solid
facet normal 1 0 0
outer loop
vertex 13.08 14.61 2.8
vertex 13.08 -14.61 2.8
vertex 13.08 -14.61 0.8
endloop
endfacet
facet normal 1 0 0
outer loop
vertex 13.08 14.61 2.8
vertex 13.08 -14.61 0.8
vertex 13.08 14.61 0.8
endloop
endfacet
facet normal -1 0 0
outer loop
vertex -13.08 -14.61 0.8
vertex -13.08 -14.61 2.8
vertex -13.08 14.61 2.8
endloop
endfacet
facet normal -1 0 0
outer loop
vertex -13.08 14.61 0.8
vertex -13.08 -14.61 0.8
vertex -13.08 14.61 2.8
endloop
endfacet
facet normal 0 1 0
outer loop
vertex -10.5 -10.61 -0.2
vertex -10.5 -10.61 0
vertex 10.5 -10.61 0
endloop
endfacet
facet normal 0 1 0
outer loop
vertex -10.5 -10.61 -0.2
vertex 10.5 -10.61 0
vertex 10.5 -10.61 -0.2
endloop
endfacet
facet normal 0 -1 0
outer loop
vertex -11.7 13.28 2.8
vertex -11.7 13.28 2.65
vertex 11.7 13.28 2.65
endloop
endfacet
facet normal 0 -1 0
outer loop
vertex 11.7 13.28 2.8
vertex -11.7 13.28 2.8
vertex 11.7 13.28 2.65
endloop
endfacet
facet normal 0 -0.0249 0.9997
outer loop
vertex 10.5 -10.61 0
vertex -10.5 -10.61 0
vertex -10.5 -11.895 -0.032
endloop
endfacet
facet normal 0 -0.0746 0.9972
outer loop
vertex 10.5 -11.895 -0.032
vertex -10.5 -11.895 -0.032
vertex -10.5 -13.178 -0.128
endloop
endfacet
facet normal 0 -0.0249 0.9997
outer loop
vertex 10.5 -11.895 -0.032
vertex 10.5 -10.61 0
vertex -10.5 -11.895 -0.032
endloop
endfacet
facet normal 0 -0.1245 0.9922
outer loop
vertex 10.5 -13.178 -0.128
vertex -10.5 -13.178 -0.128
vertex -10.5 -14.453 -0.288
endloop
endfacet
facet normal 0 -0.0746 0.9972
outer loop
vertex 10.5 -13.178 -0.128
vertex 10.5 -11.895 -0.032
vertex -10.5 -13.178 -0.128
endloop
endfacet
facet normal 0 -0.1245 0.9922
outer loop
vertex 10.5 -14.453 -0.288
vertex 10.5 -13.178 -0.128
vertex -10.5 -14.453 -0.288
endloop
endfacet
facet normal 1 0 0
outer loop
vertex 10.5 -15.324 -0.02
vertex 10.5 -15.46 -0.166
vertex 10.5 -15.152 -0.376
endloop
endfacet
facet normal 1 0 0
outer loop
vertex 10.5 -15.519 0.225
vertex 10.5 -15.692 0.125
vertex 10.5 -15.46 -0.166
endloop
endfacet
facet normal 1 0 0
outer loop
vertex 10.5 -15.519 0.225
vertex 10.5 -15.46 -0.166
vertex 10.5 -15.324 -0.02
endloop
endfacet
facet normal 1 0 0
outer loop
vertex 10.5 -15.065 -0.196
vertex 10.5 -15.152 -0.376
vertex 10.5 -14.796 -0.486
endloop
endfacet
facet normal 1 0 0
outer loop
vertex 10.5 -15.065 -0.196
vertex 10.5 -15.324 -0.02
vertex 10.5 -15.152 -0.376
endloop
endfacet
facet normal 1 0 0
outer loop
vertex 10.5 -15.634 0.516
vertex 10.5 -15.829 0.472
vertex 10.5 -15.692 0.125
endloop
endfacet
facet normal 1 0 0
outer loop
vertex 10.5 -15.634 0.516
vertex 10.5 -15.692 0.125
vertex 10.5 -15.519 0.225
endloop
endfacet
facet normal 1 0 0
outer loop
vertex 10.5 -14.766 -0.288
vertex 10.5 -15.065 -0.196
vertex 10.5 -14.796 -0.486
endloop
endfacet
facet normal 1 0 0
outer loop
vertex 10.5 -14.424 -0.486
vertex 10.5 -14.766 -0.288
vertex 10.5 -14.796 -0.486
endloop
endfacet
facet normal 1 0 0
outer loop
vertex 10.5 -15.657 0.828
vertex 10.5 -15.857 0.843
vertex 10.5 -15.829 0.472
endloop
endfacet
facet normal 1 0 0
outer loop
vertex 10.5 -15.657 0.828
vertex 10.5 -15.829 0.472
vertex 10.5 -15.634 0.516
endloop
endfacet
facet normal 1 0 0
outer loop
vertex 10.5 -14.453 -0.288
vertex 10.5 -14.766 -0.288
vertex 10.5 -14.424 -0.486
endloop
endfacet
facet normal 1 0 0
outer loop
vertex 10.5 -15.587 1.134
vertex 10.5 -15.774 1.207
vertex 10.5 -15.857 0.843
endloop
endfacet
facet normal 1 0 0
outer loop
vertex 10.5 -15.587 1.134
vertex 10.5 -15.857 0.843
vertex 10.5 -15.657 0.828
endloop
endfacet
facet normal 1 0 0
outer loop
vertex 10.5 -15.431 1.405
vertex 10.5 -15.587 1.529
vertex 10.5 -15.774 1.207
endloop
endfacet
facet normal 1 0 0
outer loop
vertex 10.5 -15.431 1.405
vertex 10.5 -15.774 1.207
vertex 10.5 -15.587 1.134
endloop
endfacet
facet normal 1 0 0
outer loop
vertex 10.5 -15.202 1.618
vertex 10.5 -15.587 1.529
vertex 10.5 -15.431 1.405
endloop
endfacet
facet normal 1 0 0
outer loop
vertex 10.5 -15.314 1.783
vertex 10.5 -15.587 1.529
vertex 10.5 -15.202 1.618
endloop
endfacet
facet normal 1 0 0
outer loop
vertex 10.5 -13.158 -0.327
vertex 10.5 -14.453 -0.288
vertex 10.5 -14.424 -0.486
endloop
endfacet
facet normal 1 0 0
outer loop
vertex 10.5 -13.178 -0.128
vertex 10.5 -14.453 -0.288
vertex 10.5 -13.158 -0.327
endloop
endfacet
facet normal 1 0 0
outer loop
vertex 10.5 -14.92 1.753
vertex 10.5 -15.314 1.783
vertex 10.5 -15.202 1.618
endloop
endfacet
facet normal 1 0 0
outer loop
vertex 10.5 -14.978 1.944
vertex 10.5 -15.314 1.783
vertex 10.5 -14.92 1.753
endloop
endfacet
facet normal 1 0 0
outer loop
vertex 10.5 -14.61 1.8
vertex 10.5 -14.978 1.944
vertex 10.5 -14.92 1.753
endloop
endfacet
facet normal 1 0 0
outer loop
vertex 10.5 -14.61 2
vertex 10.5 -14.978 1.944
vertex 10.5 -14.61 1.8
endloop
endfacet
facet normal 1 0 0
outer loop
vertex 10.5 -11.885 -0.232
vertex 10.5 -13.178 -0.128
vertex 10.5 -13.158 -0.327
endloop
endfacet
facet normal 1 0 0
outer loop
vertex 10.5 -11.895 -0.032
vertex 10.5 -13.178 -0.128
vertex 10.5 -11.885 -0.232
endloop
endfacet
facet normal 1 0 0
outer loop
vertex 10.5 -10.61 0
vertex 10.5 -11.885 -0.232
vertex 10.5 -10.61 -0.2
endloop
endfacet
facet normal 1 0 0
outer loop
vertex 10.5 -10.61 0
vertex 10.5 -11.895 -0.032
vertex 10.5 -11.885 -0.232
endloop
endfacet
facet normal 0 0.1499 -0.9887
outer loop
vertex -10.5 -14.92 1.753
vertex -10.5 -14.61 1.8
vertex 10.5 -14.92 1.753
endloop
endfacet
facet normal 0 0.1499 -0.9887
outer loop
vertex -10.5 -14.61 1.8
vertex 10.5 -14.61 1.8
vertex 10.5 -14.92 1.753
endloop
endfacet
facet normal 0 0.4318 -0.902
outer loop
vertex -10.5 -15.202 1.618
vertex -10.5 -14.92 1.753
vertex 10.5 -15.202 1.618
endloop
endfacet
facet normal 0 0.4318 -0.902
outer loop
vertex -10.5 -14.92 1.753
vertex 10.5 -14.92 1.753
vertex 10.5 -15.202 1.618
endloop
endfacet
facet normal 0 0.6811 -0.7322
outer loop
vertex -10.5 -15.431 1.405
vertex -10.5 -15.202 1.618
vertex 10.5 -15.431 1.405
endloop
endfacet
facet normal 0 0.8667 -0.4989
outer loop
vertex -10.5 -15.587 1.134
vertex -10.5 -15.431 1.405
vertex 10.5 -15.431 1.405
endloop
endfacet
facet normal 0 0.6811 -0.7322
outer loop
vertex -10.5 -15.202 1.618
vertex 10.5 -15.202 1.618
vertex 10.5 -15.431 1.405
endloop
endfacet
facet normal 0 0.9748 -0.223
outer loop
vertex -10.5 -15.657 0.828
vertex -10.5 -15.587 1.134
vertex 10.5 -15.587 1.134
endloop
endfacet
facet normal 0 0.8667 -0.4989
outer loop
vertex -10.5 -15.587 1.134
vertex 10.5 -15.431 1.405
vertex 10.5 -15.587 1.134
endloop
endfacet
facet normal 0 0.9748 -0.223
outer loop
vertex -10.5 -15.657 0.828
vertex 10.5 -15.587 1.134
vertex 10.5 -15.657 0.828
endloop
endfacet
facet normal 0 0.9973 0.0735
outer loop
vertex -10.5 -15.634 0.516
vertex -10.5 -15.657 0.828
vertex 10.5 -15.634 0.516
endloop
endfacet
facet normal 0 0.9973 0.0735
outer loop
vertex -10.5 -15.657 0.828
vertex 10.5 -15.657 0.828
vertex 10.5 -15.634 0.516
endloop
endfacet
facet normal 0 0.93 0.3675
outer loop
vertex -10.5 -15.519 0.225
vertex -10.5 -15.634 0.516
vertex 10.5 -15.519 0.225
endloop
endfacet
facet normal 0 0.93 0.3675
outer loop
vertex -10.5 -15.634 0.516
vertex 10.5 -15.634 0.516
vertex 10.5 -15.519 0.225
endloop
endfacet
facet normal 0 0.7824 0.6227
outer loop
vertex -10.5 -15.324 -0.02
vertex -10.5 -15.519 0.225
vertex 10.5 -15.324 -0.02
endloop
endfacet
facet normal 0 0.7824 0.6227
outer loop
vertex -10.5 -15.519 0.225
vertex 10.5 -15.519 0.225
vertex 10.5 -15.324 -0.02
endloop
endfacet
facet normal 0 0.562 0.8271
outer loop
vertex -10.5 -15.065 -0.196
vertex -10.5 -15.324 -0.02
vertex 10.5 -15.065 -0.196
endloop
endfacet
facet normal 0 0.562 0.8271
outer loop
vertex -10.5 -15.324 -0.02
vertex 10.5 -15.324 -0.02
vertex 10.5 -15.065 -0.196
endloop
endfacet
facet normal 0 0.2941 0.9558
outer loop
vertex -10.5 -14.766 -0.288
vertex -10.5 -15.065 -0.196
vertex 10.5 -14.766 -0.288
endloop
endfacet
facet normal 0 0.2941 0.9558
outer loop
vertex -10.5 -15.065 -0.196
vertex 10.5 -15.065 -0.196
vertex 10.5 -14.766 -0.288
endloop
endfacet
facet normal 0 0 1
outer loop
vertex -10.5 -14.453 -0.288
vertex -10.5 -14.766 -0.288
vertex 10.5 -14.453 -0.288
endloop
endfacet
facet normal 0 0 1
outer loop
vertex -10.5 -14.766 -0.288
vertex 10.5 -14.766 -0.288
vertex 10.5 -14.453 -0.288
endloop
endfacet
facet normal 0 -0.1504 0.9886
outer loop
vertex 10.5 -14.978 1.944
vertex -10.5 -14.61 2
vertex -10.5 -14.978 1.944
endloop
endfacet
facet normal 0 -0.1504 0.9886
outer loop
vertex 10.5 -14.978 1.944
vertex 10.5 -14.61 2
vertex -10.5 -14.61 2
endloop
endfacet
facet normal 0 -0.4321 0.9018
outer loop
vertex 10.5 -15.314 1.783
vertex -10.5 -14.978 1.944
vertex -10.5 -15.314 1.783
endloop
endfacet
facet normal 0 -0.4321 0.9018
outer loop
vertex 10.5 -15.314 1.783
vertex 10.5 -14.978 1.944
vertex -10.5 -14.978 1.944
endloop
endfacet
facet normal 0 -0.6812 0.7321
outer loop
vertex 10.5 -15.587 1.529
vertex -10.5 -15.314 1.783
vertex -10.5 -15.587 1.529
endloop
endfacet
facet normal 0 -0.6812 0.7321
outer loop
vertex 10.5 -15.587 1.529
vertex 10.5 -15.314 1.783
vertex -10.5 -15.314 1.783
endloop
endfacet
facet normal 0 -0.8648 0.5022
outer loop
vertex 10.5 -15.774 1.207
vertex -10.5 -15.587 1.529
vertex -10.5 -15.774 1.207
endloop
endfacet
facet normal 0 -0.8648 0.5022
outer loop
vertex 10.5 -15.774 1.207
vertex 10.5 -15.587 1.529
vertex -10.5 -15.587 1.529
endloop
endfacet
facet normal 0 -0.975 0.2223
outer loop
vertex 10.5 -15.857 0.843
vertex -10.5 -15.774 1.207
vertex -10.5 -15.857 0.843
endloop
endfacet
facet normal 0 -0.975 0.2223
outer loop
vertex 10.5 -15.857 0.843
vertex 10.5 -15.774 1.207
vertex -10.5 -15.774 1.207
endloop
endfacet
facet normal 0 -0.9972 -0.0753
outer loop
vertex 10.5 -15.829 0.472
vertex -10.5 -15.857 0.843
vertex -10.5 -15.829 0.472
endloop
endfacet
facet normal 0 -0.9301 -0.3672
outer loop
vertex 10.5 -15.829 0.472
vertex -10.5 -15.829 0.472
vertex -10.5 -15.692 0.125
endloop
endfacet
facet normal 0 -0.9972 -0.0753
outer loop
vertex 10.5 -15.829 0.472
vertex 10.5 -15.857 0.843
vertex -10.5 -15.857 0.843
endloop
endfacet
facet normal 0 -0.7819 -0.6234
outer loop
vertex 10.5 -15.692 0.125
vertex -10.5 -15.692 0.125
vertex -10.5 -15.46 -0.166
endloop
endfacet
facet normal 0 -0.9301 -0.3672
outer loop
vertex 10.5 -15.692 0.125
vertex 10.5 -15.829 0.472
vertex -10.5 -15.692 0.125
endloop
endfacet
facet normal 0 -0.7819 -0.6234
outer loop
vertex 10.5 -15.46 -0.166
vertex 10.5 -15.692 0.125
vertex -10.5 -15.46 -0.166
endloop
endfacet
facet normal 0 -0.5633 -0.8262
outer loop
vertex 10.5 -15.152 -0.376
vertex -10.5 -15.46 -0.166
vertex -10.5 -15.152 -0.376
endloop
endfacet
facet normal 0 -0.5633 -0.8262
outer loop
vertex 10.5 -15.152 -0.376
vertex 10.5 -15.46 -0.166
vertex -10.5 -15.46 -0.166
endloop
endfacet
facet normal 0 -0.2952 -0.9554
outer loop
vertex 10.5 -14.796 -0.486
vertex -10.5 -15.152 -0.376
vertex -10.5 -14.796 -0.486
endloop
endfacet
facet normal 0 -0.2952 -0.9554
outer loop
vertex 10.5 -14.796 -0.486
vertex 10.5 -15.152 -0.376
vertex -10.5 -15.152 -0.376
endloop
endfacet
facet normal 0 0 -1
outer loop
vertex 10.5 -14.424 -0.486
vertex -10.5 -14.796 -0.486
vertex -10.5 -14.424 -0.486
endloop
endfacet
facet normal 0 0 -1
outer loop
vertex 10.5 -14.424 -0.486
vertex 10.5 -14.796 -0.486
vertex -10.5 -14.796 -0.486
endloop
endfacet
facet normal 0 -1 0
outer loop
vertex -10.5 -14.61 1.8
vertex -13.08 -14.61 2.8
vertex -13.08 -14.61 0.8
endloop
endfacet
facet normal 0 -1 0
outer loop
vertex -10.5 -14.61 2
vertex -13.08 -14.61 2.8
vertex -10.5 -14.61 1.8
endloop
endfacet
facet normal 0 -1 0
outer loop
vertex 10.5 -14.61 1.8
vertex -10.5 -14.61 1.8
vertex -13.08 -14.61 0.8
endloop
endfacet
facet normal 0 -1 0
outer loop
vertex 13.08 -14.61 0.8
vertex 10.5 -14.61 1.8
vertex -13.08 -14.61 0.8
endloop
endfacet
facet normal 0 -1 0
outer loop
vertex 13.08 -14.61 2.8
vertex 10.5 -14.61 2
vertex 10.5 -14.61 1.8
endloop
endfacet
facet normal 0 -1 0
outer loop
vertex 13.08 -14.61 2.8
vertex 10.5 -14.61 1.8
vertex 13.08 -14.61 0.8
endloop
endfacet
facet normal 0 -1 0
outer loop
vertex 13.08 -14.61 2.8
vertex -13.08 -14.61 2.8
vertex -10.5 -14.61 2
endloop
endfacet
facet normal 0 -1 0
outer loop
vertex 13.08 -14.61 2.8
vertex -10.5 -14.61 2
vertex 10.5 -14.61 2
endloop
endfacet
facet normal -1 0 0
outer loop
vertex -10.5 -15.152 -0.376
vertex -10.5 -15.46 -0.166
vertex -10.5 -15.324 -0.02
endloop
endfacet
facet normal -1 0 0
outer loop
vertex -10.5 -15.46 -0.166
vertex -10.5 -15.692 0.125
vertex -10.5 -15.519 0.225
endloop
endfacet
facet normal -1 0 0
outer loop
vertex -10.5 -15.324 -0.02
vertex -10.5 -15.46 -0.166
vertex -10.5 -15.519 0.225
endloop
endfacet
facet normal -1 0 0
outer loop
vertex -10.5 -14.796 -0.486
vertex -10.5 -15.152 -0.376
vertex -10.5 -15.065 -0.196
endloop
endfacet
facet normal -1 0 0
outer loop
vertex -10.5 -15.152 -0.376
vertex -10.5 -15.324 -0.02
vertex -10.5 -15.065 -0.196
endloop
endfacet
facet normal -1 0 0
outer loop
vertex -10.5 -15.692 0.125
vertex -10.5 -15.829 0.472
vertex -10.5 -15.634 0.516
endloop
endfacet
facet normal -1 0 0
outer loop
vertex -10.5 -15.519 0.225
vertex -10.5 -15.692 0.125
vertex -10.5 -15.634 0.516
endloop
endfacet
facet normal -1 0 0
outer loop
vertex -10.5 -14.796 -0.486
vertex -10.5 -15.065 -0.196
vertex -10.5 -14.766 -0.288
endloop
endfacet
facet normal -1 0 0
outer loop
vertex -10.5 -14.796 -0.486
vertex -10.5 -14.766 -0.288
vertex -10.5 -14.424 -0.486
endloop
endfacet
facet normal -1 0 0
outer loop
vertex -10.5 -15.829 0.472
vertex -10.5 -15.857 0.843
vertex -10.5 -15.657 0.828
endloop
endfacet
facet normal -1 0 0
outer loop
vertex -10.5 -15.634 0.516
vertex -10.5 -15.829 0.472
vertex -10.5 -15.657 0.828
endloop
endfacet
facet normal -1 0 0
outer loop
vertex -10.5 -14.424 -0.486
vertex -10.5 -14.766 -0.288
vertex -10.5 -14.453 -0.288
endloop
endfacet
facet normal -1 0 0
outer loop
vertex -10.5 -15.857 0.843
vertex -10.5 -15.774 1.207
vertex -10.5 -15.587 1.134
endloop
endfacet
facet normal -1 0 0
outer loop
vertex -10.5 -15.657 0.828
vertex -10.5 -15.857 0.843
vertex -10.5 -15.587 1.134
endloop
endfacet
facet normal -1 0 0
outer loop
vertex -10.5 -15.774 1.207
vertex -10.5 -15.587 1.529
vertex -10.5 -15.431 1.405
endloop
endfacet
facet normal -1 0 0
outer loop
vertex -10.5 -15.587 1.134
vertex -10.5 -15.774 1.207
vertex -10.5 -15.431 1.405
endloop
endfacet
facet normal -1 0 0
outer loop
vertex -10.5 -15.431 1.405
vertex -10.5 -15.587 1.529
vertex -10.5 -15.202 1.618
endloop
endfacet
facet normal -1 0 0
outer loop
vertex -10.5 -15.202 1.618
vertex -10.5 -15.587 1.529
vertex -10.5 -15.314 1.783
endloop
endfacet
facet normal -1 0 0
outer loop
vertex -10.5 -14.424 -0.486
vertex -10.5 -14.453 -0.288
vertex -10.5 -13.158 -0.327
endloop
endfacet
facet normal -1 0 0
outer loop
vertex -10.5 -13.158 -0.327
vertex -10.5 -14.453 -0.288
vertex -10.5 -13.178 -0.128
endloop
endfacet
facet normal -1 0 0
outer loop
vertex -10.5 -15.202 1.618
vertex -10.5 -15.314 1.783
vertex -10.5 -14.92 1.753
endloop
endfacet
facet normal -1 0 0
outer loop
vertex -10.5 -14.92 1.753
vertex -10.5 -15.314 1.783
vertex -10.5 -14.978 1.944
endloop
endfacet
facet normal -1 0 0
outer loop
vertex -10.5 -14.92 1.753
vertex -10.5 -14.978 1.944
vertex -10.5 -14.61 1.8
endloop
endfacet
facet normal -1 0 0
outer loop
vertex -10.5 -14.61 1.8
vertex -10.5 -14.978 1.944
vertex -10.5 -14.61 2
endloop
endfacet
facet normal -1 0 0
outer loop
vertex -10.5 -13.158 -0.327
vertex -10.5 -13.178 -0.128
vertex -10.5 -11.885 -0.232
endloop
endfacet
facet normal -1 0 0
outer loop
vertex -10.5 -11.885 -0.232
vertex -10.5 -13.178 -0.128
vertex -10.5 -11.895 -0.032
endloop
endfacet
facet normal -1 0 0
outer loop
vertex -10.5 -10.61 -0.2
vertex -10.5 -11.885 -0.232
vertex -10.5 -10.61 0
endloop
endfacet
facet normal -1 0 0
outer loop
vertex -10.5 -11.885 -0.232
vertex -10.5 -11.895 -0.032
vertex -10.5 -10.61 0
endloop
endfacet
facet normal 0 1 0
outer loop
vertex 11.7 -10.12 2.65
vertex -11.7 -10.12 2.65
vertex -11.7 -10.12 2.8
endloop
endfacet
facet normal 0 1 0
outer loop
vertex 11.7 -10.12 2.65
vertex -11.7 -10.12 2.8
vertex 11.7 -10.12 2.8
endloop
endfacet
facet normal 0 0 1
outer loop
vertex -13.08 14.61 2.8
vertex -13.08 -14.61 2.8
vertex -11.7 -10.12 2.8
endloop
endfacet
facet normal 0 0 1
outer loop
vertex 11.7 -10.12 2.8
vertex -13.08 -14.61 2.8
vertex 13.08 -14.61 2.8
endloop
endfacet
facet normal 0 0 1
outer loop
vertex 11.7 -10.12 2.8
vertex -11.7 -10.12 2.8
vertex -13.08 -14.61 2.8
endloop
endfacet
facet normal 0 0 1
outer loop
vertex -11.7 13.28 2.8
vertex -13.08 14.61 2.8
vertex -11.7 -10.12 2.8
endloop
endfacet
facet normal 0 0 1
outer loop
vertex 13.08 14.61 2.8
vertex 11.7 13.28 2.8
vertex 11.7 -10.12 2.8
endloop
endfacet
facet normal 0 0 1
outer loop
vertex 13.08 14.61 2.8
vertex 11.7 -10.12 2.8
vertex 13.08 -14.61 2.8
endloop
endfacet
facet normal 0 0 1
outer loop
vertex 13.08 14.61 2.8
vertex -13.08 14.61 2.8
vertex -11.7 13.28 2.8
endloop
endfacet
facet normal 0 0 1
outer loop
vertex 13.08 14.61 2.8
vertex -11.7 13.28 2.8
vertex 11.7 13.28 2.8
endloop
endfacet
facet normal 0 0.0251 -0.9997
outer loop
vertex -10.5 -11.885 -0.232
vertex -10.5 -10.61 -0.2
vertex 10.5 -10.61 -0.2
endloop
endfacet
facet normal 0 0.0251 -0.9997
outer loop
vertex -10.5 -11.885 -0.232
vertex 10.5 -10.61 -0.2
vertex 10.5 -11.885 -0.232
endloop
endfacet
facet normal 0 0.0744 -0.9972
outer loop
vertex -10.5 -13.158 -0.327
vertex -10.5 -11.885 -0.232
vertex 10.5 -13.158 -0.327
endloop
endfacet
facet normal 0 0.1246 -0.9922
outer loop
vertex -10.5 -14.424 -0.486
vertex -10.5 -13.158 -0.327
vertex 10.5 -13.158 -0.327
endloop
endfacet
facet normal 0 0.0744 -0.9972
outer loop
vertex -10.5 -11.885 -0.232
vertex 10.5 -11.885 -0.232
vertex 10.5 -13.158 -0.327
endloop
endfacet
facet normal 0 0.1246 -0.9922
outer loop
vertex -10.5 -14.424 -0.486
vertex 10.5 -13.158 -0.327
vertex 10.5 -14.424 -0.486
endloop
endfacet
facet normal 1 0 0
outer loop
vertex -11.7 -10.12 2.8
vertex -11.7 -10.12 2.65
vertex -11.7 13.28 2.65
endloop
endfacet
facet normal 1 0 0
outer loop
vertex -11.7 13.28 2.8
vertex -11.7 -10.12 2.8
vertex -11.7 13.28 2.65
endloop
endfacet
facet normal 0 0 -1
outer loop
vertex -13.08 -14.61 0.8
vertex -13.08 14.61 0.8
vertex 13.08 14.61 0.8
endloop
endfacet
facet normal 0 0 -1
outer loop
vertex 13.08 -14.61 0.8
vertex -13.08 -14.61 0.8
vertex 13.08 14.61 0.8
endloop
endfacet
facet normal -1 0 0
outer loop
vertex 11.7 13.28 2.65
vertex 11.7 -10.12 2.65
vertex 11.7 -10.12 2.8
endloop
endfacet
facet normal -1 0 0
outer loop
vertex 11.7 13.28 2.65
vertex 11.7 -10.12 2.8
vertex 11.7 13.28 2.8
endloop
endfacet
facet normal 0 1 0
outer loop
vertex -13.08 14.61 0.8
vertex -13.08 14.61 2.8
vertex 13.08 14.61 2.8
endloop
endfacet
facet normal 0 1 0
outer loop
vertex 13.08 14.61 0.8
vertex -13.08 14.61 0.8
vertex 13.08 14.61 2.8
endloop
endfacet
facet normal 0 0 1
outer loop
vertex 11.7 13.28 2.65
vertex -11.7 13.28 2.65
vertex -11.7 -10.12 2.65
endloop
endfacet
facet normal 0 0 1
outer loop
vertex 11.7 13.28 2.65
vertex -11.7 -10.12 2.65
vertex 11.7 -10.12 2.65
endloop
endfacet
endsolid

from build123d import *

# Parameters (mm, degrees)
SKETCH001_W     = 26.16
SKETCH001_H     = 29.22
PAD001_DEPTH    = 2
SKETCH003_W     = 23.4
SKETCH003_H     = 23.4
POCKET001_DEPTH = 0.151
PAD002_DEPTH    = 10.5


with BuildPart() as part:
    # Sketch001 → Pad001 (new body)
    with BuildSketch(Plane.XY.offset(2.8)):
        Rectangle(SKETCH001_W, SKETCH001_H)
    extrude(amount=-PAD001_DEPTH)

    # Sketch003 → Pocket001 (cut, through all)
    with BuildSketch(Plane.XY.offset(2.65)):
        with Locations((0, 1.58)):
            Rectangle(SKETCH003_W, SKETCH003_H)
    extrude(amount=POCKET001_DEPTH, mode=Mode.SUBTRACT)

    # Sketch004 → Pad002 (join, symmetric)
    with BuildSketch(Plane.YZ):
        with BuildLine():
            ThreePointArc((-14.61, 2), (-15.856499, 0.656513), (-14.423549, -0.486016))
            ThreePointArc((-10.61, -0.2), (-12.52213, -0.271604), (-14.423549, -0.486016))
            Line((-10.61, 0), (-10.61, -0.2))
            ThreePointArc((-10.61, 0), (-12.537088, -0.072164), (-14.453381, -0.288254))
            ThreePointArc((-14.61, 1.8), (-15.657059, 0.671471), (-14.453381, -0.288254))
            Line((-14.61, 2), (-14.61, 1.8))
        make_face()
    extrude(amount=PAD002_DEPTH, both=True)


solid = part.part
